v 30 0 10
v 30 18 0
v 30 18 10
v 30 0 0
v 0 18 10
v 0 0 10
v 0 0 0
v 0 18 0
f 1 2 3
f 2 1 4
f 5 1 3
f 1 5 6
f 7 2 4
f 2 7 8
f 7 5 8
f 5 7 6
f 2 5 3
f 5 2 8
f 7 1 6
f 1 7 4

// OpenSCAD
$fn = 50;

difference() {
	union() {
		cube(size = [30, 18, 10]);
	}
	union();
}
